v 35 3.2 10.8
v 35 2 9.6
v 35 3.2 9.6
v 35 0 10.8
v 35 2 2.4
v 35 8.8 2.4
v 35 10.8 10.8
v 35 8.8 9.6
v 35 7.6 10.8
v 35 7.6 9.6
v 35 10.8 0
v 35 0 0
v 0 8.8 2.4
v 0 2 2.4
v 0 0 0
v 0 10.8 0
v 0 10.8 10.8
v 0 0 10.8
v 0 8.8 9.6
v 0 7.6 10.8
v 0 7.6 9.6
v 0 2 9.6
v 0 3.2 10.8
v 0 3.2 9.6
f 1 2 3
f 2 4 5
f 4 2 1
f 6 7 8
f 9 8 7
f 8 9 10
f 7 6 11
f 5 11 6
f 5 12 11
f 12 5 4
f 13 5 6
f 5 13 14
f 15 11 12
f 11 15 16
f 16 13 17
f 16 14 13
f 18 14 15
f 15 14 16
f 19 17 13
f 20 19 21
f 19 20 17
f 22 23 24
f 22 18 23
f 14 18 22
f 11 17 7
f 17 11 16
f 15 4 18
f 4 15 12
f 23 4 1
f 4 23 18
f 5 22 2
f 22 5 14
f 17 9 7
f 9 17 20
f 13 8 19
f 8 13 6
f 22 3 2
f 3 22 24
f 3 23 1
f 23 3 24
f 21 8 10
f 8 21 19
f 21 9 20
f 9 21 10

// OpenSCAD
// Cable Clips v1 prototype: adhesive-backed, open-top cable clip.
// Kept separate from the storage family's dimensions.

/* [Cable and clip, mm] */
cable_diameter = 6; // [3:0.5:12]
clip_length = 35;   // [15:1:70]
base_thickness = 2.4; // [1.6:0.2:5]
wall_thickness = 2.0; // [1.6:0.2:5]
grip_lip = 1.2; // [0.6:0.2:2]
cable_clearance = 0.4; // [0.2:0.1:1]

channel = cable_diameter + 2 * cable_clearance;
width = channel + 2 * wall_thickness;
wall_height = cable_diameter + cable_clearance + 2;

assert(cable_diameter >= 3 && cable_diameter <= 12, "Cable diameter must be 3..12 mm");
assert(clip_length >= 15 && clip_length <= 70, "Clip length must be 15..70 mm");
assert(base_thickness >= 1.6 && wall_thickness >= 1.6, "Clip walls/base are too thin");
assert(grip_lip >= 0.6 && 2 * grip_lip < channel - 1, "Lip leaves too little cable entry");

union() {
    cube([clip_length, width, base_thickness]);
    translate([0, 0, base_thickness])
        cube([clip_length, wall_thickness, wall_height]);
    translate([0, width - wall_thickness, base_thickness])
        cube([clip_length, wall_thickness, wall_height]);
    translate([0, wall_thickness, base_thickness + wall_height - grip_lip])
        cube([clip_length, grip_lip, grip_lip]);
    translate([0, width - wall_thickness - grip_lip,
               base_thickness + wall_height - grip_lip])
        cube([clip_length, grip_lip, grip_lip]);
}
